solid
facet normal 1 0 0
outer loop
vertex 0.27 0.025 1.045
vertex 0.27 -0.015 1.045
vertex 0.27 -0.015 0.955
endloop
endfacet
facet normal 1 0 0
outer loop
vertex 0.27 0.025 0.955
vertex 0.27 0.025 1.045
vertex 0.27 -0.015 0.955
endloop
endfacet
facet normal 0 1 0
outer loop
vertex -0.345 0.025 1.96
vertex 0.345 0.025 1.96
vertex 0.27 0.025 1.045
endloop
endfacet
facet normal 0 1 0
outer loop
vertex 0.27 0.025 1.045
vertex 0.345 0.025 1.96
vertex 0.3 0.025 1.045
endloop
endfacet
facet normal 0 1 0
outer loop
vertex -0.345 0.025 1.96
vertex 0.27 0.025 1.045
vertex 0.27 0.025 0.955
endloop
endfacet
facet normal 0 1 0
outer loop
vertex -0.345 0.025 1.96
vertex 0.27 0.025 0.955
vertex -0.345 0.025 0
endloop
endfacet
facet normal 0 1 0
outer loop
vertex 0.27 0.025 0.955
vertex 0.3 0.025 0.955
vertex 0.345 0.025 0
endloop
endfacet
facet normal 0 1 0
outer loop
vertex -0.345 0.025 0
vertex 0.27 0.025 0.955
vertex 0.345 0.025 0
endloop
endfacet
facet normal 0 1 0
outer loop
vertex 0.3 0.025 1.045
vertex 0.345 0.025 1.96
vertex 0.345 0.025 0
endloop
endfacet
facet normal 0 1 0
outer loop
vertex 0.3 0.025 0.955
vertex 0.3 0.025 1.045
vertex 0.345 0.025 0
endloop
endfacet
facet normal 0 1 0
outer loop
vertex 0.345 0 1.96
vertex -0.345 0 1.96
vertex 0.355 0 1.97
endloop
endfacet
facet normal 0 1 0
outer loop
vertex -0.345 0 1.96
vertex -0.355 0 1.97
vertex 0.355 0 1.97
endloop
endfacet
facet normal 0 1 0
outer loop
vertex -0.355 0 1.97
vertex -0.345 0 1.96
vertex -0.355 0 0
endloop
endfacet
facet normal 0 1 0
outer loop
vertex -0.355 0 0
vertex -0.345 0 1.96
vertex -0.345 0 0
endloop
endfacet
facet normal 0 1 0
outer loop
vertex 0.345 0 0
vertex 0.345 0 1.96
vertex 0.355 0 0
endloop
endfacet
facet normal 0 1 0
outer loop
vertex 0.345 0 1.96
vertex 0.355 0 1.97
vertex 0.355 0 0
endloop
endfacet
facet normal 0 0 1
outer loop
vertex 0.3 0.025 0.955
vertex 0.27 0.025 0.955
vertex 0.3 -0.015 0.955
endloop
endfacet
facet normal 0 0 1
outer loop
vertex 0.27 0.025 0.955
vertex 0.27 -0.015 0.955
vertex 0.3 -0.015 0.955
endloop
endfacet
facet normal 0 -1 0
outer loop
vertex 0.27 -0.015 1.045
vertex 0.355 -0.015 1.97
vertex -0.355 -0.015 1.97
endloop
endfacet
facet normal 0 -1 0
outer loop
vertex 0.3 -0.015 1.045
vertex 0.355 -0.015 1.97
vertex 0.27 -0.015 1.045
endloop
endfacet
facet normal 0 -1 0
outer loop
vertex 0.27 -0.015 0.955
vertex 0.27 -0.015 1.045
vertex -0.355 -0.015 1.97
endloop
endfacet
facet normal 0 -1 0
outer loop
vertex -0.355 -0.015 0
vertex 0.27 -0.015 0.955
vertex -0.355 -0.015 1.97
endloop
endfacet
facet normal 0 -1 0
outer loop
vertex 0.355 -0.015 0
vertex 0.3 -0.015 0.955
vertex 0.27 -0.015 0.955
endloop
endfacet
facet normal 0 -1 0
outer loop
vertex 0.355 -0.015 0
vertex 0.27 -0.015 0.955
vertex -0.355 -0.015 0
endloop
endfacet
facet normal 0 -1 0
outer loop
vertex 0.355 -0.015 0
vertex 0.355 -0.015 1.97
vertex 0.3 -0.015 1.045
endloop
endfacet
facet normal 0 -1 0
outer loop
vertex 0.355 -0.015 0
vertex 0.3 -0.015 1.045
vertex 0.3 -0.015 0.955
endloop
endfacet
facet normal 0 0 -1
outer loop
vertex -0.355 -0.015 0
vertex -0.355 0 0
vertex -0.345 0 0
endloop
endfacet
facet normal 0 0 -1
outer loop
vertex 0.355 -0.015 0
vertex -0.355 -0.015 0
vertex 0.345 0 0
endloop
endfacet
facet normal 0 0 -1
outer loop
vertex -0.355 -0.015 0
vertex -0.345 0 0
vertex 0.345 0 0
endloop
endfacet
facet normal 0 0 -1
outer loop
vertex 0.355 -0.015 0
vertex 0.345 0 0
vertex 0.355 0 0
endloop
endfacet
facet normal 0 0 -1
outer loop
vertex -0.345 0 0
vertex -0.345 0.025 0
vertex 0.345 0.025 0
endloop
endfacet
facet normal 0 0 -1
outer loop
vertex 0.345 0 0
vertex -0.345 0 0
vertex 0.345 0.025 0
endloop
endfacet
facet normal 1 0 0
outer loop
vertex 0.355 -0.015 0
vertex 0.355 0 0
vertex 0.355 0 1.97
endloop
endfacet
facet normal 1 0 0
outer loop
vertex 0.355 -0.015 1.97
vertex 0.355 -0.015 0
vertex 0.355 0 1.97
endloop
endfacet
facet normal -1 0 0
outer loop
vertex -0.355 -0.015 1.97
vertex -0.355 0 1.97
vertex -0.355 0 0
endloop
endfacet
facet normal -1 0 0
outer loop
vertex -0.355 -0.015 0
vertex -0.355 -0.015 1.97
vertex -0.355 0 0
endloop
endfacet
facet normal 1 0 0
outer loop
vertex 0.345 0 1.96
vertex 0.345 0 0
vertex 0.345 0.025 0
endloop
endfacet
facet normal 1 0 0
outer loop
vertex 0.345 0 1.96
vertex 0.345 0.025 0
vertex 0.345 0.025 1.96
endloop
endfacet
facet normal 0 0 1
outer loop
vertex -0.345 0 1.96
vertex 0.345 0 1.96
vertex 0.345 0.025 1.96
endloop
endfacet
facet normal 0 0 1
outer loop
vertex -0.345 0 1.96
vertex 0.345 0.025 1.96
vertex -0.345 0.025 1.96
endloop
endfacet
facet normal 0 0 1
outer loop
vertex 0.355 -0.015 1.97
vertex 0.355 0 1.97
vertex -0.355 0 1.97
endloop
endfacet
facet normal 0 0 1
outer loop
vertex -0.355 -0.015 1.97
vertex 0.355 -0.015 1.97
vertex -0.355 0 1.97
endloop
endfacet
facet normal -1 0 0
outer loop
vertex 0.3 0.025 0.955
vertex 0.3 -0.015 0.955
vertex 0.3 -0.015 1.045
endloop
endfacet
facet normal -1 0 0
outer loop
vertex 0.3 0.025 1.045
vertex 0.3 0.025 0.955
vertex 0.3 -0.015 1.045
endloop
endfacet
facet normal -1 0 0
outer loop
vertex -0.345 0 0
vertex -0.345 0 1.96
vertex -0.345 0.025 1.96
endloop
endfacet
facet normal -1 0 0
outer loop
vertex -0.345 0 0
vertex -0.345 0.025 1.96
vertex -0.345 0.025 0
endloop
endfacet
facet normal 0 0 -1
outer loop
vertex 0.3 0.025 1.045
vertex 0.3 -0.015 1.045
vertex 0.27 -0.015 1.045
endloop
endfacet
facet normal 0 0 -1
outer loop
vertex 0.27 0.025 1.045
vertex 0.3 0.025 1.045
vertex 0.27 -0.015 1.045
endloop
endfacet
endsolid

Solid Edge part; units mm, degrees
sketch "Sketch1" plane through (0, 0, 0) normal (0, -1, 0) x (1, 0, 0)
  line L0 (-0.345, 0) -> (0.345, 0)
  line L1 (0.345, 0) -> (0.345, 1.96)
  line L2 (0.345, 1.96) -> (-0.345, 1.96)
  line L3 (-0.345, 1.96) -> (-0.345, 0)
  dimension "D1" = 1.96
  dimension "D2" = 0.69
extrude "Protrusion1" add sketch "Sketch1" against normal blind 0.025
sketch "Sketch2" plane through (0, 0, 0.98) normal (0, -1, 0) x (1, 0, 0)
  line L0 (-0.355, -0.98) -> (0.355, -0.98)
  line L1 (0.355, -0.98) -> (0.355, 0.99)
  line L2 (0.355, 0.99) -> (-0.355, 0.99)
  line L3 (-0.355, 0.99) -> (-0.355, -0.98)
extrude "Ausprägung_2" add sketch "Sketch2" along normal blind 0.015
extrude "Ausschnitt_1" [suppressed]
extrude "Cutout1" [suppressed]
extrude "Ausprägung_3" [suppressed]
sketch "Sketch3" plane through (0, -0.015, 0.985) normal (0, -1, 0) x (1, 0, 0)
  line L0 (0.27, -0.03) -> (0.3, -0.03)
  line L1 (0.3, -0.03) -> (0.3, 0.06)
  line L2 (0.3, 0.06) -> (0.27, 0.06)
  line L3 (0.27, 0.06) -> (0.27, -0.03)
  dimension "D1" = 0.03
  dimension "D2" = 0.09
  dimension "D3" = 0.07
  dimension "D4" = 1
extrude "Cutout2" cut sketch "Sketch3" against normal through all
